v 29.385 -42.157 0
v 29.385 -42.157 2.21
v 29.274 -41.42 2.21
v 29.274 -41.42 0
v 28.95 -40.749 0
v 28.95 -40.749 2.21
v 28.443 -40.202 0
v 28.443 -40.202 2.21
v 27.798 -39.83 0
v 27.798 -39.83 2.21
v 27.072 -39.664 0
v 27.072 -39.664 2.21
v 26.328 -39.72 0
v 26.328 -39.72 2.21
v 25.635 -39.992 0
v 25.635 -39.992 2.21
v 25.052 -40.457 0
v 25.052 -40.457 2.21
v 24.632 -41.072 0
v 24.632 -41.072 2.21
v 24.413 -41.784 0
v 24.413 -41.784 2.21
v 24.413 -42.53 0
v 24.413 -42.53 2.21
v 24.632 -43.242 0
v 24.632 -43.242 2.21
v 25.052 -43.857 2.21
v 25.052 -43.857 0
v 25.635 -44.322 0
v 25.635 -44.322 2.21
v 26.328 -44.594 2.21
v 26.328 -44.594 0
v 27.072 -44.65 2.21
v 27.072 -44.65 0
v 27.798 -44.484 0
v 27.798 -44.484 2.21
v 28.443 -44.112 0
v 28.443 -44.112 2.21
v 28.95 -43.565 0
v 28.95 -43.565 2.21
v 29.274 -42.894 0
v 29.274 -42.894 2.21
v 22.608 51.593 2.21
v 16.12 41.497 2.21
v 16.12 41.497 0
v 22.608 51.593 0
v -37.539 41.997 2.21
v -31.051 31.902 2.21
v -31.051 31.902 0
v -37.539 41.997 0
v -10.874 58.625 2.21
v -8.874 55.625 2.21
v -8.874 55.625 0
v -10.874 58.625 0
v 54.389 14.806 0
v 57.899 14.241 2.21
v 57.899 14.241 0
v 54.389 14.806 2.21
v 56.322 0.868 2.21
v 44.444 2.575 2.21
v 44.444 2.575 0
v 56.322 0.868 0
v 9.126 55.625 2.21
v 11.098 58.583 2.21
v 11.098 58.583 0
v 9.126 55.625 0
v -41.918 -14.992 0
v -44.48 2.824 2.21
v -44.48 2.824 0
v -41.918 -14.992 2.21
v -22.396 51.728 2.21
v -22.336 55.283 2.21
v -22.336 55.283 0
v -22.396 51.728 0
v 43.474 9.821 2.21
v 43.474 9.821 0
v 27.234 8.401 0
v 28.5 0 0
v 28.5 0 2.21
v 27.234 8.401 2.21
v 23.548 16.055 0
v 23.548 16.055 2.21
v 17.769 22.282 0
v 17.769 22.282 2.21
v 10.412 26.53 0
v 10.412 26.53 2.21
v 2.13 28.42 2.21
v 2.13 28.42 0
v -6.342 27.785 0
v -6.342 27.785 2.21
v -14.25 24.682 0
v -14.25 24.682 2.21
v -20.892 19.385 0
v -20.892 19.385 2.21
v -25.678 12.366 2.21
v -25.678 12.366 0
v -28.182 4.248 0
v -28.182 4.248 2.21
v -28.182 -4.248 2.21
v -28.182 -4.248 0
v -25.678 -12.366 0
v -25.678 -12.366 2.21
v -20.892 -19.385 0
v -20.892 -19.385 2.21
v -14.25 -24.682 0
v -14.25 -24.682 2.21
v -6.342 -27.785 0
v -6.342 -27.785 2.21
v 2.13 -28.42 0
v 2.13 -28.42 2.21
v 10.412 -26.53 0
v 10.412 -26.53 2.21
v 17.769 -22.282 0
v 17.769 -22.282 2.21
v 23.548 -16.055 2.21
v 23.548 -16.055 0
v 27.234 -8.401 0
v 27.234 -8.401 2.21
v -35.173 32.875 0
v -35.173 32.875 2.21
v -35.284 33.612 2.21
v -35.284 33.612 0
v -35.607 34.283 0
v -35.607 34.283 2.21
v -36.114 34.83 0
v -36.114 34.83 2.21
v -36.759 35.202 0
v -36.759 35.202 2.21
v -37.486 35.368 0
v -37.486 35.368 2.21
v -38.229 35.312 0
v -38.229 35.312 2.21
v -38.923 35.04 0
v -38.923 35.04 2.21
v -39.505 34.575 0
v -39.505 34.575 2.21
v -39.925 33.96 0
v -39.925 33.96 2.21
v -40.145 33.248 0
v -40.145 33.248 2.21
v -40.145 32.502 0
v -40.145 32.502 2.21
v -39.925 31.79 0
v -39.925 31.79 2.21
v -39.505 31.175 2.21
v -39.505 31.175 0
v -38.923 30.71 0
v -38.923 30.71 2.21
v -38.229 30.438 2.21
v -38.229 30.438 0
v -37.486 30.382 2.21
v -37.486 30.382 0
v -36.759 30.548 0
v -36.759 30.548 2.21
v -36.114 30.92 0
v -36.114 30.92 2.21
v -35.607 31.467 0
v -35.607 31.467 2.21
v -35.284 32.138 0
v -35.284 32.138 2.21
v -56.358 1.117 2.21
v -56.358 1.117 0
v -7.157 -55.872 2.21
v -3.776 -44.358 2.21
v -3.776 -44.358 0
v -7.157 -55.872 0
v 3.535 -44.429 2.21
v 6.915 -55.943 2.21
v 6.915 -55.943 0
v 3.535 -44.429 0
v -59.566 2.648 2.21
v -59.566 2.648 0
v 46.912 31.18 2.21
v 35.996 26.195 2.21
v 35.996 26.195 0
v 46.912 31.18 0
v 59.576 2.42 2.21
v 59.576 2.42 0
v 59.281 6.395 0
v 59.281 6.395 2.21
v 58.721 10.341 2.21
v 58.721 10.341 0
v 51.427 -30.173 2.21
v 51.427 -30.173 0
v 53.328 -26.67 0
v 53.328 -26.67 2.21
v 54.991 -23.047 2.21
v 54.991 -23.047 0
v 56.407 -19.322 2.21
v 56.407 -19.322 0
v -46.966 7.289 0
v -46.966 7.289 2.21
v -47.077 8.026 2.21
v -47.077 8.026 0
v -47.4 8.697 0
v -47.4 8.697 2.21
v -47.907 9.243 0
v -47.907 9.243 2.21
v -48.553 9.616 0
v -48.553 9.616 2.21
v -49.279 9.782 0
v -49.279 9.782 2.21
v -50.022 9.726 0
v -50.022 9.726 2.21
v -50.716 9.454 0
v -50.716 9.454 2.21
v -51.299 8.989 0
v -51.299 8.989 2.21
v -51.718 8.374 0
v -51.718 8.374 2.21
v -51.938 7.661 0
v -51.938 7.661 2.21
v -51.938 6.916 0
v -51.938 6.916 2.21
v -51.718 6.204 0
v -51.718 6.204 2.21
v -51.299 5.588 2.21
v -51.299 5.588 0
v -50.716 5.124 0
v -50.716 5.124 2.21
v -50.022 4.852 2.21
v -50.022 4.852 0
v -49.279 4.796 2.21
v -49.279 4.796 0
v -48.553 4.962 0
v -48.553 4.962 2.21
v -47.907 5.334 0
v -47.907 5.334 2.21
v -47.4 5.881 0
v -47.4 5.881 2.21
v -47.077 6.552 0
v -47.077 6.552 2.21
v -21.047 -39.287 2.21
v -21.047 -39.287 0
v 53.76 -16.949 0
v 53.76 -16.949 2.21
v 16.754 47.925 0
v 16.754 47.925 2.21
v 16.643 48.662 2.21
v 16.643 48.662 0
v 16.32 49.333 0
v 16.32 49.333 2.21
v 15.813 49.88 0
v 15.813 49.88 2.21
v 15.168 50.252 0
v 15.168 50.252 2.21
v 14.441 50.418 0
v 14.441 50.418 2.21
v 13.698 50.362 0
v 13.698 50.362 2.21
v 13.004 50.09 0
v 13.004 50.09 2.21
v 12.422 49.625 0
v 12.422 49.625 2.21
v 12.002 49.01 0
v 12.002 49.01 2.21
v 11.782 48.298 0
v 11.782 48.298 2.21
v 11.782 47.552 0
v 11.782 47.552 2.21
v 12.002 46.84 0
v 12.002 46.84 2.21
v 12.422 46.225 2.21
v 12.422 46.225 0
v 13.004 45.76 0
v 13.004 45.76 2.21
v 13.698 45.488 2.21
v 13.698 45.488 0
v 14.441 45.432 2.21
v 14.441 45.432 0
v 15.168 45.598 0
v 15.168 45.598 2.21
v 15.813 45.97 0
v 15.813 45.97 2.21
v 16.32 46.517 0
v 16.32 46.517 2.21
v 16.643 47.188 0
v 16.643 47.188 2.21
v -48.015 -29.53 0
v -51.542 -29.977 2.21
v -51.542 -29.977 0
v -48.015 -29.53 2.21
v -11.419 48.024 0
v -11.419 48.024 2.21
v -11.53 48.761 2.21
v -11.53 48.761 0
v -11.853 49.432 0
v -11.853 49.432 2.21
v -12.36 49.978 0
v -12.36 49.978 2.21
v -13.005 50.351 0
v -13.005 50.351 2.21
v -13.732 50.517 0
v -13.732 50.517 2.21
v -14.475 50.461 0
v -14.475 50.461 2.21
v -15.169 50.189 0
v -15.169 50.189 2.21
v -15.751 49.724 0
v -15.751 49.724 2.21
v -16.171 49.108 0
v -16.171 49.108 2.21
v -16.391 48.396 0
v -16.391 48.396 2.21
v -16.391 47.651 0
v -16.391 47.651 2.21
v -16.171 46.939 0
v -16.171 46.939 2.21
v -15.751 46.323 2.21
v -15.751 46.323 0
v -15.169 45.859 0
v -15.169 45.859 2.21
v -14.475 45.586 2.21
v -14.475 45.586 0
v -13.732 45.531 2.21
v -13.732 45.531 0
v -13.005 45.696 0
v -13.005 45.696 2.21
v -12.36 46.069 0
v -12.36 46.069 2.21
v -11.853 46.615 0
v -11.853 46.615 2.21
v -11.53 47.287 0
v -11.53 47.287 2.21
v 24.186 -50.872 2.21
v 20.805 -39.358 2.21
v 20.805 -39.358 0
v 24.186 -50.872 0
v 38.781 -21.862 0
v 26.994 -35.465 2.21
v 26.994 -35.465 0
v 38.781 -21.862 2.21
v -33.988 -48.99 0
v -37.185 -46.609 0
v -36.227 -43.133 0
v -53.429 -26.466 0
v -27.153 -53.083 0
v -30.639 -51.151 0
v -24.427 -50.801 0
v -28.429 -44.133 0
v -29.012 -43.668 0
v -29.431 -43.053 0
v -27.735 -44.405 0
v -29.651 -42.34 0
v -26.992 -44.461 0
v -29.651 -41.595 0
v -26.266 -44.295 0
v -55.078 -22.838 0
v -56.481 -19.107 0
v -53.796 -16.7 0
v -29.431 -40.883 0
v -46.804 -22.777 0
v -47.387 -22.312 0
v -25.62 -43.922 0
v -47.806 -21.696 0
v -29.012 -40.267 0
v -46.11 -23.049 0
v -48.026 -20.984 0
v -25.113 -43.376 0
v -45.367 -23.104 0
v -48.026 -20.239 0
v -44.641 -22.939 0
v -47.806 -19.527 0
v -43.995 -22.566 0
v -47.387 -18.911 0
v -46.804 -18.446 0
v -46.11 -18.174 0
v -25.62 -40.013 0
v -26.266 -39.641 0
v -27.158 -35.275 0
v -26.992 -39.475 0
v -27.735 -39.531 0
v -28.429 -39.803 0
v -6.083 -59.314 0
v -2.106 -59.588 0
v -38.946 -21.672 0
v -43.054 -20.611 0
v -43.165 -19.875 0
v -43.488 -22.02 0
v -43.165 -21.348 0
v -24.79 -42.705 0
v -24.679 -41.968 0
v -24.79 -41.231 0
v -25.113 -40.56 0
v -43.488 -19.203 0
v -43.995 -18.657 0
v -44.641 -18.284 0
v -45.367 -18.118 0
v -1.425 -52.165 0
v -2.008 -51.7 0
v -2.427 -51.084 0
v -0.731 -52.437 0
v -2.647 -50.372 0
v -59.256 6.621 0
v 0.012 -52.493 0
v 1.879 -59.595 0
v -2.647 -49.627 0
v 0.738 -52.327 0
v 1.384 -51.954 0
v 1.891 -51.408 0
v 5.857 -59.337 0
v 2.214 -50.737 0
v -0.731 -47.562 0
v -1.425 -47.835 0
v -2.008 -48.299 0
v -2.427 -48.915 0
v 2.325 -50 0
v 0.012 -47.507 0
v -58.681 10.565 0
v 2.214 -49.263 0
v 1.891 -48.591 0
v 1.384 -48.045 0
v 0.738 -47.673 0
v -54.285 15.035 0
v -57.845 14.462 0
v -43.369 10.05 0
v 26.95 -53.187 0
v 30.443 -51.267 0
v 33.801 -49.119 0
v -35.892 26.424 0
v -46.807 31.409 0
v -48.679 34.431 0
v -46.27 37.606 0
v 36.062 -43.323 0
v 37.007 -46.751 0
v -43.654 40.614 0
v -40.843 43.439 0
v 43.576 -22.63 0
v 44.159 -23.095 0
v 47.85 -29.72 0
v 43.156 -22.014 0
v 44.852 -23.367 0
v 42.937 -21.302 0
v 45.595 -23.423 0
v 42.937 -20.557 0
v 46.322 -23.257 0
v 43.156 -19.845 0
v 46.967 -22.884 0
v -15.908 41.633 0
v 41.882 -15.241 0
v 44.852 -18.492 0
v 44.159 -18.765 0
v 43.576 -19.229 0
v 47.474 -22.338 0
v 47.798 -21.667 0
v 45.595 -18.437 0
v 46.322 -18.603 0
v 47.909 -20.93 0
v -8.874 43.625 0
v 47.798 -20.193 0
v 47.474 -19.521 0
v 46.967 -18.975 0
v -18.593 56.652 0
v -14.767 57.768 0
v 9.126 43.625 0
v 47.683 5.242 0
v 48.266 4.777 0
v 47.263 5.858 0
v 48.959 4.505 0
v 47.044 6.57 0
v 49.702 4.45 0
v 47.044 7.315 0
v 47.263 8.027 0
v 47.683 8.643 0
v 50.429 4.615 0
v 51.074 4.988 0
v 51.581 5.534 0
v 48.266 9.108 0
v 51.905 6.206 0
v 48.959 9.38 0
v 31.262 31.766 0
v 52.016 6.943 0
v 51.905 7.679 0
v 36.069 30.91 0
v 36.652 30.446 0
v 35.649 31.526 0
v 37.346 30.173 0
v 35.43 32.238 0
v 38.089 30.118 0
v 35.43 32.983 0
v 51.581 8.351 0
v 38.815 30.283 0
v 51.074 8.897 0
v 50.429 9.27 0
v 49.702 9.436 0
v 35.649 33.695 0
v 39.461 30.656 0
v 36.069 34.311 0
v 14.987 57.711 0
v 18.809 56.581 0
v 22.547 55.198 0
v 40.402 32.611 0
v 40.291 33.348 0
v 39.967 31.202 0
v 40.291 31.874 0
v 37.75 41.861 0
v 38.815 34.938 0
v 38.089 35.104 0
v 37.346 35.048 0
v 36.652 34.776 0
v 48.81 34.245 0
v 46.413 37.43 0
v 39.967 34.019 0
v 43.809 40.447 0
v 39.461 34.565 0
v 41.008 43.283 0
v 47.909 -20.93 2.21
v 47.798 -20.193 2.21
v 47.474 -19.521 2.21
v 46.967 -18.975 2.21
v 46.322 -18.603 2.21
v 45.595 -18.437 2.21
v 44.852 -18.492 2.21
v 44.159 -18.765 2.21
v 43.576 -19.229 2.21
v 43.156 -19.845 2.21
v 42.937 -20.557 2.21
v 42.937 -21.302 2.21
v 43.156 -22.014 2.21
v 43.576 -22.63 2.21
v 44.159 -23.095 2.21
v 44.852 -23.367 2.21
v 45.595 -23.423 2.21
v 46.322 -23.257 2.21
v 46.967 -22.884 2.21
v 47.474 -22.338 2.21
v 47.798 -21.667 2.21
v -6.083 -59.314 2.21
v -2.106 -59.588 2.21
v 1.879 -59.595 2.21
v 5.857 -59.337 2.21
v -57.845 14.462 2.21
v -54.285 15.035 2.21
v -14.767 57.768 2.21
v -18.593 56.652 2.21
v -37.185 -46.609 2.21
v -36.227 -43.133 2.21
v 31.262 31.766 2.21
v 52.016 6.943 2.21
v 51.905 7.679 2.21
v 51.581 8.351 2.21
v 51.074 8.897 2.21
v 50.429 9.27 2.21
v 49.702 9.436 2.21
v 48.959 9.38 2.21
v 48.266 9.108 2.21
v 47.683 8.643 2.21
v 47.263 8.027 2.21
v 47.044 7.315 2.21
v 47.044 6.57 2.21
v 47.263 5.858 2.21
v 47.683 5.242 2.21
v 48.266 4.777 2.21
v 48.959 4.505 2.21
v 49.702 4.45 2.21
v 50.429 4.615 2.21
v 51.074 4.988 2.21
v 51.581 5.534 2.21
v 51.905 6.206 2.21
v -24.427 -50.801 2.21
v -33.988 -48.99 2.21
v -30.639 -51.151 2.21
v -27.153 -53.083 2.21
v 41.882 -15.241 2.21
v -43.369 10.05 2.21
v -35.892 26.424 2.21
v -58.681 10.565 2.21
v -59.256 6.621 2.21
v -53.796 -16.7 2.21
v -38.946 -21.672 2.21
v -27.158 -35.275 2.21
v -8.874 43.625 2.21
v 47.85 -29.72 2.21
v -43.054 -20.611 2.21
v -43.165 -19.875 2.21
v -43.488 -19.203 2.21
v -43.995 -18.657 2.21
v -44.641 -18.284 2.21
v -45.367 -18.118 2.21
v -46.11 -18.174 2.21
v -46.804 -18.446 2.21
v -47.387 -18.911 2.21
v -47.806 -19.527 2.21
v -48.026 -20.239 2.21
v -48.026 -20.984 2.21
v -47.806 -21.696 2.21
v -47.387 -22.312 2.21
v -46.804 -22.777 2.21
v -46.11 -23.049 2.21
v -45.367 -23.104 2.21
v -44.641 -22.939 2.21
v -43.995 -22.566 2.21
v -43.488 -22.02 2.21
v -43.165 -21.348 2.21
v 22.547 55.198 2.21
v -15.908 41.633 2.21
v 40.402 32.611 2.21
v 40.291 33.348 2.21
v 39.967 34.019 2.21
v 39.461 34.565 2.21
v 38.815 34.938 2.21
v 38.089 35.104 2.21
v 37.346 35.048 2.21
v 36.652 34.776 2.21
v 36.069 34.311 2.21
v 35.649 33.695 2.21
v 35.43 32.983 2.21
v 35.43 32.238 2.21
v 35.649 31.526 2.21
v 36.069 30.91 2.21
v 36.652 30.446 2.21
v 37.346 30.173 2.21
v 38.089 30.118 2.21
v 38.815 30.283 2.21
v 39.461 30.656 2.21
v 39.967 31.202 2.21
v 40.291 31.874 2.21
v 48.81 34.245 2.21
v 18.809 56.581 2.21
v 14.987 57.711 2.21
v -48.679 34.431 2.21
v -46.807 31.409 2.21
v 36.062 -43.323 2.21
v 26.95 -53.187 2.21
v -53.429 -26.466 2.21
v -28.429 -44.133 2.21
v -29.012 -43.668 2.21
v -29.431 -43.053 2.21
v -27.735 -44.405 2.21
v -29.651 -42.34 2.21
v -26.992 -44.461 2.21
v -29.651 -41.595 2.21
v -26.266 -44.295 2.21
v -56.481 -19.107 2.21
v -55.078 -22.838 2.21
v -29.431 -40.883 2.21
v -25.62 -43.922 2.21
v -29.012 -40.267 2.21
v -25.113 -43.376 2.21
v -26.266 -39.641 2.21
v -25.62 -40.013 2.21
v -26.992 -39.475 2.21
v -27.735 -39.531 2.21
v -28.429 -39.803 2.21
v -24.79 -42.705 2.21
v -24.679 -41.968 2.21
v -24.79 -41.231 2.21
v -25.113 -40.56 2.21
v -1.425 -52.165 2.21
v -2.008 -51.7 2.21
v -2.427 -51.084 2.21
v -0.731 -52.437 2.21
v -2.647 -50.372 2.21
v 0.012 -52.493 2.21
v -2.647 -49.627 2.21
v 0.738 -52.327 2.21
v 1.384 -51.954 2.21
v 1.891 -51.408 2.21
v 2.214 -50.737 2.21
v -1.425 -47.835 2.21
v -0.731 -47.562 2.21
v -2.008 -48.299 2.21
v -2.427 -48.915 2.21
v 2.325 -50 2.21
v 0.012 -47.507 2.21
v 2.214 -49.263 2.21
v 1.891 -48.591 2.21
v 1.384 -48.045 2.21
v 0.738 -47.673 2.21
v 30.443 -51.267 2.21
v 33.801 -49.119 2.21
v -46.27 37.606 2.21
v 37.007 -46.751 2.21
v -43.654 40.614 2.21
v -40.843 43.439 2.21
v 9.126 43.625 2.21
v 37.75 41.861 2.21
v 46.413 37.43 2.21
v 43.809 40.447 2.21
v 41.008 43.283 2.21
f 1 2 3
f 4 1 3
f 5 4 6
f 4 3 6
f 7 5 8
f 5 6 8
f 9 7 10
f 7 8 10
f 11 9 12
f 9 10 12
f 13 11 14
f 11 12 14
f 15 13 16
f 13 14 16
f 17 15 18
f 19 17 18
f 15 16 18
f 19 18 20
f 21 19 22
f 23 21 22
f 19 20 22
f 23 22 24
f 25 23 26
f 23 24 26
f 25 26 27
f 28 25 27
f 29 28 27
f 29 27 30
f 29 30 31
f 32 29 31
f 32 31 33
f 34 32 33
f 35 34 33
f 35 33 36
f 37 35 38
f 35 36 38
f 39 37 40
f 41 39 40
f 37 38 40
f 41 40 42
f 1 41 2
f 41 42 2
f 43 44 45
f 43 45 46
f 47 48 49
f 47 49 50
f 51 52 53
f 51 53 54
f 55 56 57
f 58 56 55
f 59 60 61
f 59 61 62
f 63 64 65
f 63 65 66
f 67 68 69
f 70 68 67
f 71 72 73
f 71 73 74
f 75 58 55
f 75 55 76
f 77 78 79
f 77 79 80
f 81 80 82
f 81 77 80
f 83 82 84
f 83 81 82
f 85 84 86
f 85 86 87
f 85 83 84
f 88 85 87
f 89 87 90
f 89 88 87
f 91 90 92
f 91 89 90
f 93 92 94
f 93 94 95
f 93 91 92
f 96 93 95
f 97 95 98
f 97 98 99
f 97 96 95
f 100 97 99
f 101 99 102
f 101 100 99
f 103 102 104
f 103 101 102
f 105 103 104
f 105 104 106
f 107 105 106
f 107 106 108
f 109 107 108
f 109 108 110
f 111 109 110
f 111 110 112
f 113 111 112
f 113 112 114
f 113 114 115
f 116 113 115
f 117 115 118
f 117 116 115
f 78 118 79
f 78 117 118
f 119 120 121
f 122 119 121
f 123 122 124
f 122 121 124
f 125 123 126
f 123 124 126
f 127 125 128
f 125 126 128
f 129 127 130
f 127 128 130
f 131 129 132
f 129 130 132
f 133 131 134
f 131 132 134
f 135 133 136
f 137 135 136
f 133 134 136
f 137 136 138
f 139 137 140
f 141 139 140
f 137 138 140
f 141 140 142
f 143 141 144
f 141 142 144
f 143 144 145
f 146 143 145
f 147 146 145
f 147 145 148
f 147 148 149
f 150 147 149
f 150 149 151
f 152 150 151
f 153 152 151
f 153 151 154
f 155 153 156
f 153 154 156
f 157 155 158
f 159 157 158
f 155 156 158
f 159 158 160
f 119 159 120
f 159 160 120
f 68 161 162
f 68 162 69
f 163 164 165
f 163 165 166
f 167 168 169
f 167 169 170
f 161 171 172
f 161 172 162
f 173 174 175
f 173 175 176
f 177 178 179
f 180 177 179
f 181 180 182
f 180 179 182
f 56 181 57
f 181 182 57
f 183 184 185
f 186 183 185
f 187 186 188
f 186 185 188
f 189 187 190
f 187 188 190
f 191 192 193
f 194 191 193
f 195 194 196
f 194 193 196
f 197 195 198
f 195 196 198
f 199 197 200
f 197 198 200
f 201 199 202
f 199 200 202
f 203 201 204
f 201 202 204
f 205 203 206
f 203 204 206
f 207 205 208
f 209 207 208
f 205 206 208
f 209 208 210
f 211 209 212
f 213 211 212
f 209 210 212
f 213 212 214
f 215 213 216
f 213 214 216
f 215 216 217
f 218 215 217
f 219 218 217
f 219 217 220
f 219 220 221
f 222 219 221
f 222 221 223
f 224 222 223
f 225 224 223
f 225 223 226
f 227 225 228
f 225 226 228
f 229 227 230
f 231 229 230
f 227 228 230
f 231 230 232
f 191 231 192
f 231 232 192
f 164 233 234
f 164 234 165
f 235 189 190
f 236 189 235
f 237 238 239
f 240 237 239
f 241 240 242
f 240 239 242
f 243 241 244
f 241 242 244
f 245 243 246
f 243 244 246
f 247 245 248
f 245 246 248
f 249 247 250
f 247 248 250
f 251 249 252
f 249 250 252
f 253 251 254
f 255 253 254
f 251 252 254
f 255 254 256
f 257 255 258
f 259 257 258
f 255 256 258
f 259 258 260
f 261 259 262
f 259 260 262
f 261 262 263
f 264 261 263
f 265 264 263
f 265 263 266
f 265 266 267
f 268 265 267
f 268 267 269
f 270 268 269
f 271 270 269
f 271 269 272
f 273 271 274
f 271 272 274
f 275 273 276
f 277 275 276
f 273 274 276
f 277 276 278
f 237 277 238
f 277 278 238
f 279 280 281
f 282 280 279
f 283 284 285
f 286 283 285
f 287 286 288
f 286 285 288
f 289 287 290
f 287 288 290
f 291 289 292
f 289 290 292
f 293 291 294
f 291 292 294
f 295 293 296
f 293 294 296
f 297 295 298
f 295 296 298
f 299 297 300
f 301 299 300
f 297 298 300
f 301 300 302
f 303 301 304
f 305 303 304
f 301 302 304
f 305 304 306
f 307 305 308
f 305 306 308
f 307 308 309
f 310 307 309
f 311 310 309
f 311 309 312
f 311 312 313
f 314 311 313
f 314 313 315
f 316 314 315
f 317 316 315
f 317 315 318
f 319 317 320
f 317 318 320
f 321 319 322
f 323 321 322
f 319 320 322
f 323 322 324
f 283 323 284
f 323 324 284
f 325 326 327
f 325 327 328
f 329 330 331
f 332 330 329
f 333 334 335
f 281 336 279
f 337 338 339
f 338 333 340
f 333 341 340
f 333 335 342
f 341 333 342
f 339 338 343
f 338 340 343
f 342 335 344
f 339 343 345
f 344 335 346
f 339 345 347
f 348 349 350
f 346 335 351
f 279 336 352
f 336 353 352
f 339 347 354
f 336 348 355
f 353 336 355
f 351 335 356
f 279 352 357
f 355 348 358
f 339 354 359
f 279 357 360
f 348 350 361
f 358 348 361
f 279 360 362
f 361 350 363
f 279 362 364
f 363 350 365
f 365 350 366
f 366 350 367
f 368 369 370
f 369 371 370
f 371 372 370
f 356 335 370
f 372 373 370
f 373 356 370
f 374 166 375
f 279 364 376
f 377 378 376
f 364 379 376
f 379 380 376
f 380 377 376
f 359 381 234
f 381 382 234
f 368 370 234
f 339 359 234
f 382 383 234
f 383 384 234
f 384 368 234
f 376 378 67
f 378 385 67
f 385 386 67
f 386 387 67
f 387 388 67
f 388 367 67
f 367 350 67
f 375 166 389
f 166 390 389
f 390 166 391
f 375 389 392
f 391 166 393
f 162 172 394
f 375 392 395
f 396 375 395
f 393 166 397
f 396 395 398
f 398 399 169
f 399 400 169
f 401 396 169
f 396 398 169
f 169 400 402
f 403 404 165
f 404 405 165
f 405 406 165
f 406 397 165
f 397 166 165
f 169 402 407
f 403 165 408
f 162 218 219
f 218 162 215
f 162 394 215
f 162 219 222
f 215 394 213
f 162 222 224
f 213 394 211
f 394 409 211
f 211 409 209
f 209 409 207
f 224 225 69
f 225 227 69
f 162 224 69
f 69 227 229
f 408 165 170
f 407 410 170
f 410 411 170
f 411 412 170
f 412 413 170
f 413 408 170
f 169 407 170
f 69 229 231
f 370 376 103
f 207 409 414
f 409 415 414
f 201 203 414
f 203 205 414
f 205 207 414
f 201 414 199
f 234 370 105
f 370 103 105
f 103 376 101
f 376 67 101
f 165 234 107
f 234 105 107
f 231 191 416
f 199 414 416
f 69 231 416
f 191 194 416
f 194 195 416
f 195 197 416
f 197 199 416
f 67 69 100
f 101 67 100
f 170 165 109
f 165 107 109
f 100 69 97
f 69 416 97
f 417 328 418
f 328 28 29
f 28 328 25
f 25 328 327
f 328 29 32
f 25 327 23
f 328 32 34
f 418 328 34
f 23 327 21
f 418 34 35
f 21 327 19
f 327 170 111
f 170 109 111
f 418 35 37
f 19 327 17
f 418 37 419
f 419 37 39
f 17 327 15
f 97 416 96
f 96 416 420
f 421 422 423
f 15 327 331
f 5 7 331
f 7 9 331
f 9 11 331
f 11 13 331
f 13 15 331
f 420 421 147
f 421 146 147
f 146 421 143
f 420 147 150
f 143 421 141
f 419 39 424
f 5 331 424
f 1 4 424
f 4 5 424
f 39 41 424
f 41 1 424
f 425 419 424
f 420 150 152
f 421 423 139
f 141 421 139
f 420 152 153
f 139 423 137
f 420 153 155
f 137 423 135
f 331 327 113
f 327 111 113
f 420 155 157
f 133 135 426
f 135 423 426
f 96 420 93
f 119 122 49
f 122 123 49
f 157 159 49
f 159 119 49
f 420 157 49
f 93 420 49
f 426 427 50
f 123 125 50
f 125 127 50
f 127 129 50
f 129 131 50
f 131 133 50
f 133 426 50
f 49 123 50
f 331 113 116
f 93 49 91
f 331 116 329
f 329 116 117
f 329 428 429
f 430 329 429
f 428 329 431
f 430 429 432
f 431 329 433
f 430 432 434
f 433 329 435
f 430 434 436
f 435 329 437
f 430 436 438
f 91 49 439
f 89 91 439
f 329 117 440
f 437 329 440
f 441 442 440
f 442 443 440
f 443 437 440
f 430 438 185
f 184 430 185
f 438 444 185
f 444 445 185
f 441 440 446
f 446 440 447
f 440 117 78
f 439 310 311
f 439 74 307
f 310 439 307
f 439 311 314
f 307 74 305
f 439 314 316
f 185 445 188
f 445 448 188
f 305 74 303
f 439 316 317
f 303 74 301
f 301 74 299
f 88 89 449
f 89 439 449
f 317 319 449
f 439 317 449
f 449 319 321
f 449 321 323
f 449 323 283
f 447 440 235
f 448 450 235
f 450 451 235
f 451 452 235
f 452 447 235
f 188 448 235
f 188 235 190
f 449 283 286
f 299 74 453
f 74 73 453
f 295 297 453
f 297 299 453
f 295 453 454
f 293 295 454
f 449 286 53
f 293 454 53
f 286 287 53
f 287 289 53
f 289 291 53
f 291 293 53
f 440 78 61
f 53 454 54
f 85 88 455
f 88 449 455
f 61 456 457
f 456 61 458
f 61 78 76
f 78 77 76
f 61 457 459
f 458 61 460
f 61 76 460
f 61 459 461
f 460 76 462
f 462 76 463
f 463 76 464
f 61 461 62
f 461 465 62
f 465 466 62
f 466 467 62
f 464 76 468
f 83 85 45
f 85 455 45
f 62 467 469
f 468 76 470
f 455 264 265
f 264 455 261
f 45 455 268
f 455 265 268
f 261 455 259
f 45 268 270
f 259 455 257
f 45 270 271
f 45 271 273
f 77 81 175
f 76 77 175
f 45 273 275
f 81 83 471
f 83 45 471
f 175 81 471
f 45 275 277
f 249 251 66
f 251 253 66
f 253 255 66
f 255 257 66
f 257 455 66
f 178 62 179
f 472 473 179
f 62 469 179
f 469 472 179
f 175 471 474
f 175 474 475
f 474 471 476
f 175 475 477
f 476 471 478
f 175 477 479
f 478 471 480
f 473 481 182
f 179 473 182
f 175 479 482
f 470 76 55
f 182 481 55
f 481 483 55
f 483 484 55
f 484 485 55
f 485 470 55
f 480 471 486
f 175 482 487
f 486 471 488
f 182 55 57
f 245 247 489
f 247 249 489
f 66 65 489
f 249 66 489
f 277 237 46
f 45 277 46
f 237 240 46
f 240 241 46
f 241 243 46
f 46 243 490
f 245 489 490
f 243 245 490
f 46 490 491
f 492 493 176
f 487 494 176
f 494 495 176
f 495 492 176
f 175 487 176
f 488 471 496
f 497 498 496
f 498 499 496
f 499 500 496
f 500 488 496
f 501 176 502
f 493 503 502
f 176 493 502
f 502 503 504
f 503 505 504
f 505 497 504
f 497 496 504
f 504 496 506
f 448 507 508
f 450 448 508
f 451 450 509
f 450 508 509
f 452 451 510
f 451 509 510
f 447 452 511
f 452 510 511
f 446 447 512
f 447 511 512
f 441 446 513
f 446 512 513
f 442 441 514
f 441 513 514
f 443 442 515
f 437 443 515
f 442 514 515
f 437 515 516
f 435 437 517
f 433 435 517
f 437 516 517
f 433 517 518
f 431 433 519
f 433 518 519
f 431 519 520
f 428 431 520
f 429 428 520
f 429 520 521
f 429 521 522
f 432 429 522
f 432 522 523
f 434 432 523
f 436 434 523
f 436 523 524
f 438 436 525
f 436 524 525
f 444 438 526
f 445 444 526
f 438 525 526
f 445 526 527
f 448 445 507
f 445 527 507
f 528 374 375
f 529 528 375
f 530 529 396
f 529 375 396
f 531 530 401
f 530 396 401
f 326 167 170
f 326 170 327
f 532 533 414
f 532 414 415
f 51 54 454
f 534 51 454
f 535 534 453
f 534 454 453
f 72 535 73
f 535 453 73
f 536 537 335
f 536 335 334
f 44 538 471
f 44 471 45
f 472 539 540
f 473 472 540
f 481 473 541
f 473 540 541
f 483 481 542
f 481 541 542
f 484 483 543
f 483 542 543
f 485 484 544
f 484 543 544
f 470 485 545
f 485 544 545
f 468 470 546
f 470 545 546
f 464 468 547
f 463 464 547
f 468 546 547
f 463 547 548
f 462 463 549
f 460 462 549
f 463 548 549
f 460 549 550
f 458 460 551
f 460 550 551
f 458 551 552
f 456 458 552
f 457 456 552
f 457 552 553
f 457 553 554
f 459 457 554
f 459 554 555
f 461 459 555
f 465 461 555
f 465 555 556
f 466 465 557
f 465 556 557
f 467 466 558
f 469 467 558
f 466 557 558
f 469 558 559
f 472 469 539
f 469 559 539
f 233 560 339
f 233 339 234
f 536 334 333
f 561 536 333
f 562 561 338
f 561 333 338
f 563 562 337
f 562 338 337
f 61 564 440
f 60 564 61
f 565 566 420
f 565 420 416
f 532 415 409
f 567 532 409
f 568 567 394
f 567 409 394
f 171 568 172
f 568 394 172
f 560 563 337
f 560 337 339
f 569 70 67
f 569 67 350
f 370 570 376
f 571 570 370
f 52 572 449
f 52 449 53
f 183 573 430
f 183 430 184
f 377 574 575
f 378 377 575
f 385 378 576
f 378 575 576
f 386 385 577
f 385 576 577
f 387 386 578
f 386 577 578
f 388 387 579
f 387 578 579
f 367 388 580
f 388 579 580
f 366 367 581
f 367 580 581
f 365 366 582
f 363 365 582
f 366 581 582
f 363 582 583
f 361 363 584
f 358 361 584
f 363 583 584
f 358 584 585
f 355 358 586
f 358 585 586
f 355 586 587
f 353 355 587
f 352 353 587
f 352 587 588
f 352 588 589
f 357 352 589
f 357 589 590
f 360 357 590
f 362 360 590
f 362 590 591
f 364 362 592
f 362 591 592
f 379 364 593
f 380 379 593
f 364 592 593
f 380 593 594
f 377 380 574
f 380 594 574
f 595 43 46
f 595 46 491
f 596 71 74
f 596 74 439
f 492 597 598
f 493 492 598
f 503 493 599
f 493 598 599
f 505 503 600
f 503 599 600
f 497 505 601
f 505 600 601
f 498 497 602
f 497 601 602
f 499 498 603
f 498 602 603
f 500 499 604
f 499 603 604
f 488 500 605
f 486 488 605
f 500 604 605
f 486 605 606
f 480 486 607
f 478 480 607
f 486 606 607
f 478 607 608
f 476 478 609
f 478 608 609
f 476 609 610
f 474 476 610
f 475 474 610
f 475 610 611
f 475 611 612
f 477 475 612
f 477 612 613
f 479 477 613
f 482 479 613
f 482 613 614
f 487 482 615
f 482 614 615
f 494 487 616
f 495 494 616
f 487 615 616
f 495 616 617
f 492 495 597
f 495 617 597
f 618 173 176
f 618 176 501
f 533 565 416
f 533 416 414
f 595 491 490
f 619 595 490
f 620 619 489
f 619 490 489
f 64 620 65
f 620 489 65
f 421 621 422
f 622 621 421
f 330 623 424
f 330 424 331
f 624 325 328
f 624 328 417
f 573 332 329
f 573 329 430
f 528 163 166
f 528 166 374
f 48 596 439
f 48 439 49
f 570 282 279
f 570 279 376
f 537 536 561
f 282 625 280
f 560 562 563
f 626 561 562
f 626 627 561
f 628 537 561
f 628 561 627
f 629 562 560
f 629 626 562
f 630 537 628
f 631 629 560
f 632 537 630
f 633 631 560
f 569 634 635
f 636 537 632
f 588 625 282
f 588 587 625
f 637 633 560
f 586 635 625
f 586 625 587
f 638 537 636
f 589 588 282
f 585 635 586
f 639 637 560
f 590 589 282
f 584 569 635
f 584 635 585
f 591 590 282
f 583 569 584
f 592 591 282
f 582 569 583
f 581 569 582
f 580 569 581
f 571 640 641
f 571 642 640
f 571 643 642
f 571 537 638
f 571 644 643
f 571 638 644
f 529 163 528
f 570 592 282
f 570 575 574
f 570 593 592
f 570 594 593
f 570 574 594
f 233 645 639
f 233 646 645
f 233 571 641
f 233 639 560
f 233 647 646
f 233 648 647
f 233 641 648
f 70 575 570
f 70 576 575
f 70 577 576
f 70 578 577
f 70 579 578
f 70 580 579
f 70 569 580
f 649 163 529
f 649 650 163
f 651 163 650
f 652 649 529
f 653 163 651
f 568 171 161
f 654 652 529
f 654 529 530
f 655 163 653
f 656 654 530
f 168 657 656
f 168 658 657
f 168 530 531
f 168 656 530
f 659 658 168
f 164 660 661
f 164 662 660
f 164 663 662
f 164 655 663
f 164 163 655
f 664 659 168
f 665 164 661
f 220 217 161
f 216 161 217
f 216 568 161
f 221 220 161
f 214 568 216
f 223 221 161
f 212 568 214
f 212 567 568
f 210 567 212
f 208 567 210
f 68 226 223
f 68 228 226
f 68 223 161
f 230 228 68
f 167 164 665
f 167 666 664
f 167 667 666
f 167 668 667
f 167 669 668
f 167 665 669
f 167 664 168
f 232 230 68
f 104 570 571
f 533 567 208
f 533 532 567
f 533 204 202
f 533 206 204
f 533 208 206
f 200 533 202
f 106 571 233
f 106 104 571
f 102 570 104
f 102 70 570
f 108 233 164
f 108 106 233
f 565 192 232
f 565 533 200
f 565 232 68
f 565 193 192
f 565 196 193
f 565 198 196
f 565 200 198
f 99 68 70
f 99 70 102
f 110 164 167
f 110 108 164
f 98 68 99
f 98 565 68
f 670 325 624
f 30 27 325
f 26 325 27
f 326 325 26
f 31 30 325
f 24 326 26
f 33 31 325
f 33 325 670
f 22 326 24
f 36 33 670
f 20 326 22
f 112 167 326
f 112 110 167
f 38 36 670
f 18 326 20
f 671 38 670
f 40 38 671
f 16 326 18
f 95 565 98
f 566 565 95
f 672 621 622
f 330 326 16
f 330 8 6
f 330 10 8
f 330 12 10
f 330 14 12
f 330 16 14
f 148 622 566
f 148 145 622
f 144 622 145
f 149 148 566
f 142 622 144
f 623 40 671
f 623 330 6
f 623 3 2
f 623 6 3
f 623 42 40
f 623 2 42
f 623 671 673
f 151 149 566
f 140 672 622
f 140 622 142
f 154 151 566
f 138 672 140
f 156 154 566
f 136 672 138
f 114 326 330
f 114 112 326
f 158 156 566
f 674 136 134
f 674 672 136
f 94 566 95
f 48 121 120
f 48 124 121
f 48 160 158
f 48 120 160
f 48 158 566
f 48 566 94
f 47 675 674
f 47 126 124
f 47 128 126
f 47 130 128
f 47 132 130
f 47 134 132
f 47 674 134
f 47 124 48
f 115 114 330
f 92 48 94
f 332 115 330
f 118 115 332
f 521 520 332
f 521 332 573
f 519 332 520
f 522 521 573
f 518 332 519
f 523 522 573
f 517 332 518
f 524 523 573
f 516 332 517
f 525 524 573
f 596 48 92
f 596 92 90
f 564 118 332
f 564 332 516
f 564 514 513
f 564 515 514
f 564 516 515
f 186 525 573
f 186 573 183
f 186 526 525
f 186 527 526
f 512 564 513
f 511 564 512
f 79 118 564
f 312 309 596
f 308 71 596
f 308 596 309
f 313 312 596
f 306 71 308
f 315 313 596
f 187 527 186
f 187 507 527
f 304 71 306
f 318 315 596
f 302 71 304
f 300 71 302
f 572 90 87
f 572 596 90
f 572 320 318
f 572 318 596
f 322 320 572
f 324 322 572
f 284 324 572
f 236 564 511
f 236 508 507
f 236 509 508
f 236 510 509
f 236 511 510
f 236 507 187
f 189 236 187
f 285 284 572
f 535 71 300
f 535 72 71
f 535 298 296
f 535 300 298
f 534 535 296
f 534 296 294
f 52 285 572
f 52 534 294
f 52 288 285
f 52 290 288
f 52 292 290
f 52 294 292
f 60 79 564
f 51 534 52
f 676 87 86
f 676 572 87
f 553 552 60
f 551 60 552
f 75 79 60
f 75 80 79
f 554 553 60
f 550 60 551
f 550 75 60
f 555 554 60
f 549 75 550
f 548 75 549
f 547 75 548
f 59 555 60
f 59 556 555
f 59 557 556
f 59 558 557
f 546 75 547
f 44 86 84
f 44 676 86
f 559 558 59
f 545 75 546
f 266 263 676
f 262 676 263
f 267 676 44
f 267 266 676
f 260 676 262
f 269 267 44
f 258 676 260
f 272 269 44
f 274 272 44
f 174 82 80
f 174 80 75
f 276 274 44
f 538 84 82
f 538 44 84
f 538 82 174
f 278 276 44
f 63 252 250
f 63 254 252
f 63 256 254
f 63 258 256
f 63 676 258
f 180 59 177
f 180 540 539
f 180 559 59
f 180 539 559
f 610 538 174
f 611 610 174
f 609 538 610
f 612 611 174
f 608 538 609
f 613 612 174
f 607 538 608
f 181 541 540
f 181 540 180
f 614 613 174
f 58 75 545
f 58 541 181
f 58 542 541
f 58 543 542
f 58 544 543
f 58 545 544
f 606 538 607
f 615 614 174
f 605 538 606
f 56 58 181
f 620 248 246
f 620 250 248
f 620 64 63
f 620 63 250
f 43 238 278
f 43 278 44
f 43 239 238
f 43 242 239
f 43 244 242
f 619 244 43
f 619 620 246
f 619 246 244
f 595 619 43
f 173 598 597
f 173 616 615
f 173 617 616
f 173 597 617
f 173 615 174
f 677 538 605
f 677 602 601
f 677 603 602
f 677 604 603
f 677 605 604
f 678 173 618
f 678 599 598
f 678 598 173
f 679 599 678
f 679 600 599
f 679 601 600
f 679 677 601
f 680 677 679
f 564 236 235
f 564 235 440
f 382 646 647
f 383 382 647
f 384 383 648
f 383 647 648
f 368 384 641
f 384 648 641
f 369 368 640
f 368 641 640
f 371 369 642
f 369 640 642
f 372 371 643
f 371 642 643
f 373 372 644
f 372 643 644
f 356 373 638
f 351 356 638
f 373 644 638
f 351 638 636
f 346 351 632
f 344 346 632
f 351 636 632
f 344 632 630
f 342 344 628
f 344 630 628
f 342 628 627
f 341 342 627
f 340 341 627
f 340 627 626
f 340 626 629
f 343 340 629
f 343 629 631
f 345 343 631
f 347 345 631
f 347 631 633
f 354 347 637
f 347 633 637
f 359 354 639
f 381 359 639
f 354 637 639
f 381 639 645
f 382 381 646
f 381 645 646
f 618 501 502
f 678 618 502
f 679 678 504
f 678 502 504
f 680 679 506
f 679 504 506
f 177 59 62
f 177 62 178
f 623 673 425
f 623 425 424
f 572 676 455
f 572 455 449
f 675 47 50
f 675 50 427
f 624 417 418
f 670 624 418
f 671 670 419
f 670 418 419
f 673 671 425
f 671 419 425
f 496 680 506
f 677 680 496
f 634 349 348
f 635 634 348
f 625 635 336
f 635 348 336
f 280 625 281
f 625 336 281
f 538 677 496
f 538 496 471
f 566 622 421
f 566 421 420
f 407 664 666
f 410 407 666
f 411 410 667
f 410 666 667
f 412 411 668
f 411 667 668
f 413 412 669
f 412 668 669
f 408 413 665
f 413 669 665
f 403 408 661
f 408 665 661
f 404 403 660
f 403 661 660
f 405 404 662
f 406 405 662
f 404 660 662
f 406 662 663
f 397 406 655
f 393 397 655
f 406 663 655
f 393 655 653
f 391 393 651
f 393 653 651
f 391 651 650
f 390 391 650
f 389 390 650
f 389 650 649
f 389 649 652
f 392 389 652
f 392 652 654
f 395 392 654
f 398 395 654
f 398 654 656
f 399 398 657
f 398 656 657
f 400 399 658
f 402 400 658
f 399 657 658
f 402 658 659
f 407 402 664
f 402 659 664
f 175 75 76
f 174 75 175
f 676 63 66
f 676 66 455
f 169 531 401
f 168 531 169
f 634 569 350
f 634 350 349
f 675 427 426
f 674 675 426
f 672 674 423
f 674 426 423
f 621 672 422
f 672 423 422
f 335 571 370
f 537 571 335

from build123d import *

# Parameters (mm, degrees)
SKETCH1_R           = 59.625
SKETCH1_R_2         = 28.5
BOSS_EXTRUDE1_DEPTH = 2.21
CUT_EXTRUDE2_DEPTH  = 2.21
SKETCH6_R           = 2.5
CUT_EXTRUDE4_DEPTH  = 2.21


with BuildPart() as part:
    # Sketch1 → Boss-Extrude1 (new body)
    with BuildSketch(Plane.XY):
        Circle(SKETCH1_R)
        Circle(SKETCH1_R_2, mode=Mode.SUBTRACT)
    extrude(amount=BOSS_EXTRUDE1_DEPTH)

    # Sketch2 → Cut-Extrude2 (cut)
    with BuildSketch(Plane.XY.offset(2.21)):
        Polygon((-8.874281585, 55.625), (-10.874281585, 58.625), (-8.874281585, 59.625), (9.125718415, 59.625), (11.125718415, 58.625), (9.125718415, 55.625), (9.125718415, 43.625), (-8.874281585, 43.625), align=None)
        Polygon((22.607624736, 51.592526614), (22.547040123, 55.197568848), (24.770188006, 54.957540746), (39.912751597, 45.226006032), (41.054617845, 43.303470864), (37.750188327, 41.8609919), (31.262498517, 31.765949506), (16.119934926, 41.49748422), align=None)
        Polygon((46.911769941, 31.179790564), (48.809835901, 34.245299594), (50.550297923, 32.841450616), (58.027768157, 16.4680747), (57.948966187, 14.233395696), (54.389240175, 14.806414648), (43.473656231, 9.821434492), (35.996185997, 26.194810408), align=None)
        Polygon((56.321759653, 0.867691316), (59.575853655, 2.420389685), (60.281045421, 0.298431963), (57.719378332, -17.518353991), (56.444927213, -19.355682037), (53.760092564, -16.949094638), (41.882235262, -15.241316579), (44.443902351, 2.575469375), align=None)
        Polygon((47.849988626, -29.719893795), (51.426958817, -30.172976848), (50.872986923, -32.339336731), (39.085493712, -45.942829069), (37.02002267, -46.799467484), (36.062495415, -43.323386133), (26.993500522, -35.465057326), (38.780993734, -21.861564987), align=None)
        Polygon((24.186184301, -50.871622616), (26.950367919, -53.186636423), (25.313114529, -54.709594511), (8.042241004, -59.780780534), (5.8415225, -59.384752674), (6.915310776, -55.942808639), (3.534520094, -44.428892956), (20.805393619, -39.357706933), align=None)
        Polygon((-7.156562647, -55.871970699), (-6.08277437, -59.313914733), (-8.283492875, -59.709942593), (-25.5543664, -54.63875657), (-27.19161979, -53.115798483), (-24.427436172, -50.800784675), (-21.04664549, -39.286868992), (-3.775771965, -44.358055015), align=None)
        Polygon((-36.227151521, -43.133362857), (-37.184678776, -46.609444207), (-39.250149819, -45.752805792), (-51.03764303, -32.149313454), (-51.591614923, -29.982953571), (-48.014644732, -29.529870518), (-38.94564984, -21.671541711), (-27.158156629, -35.275034049), align=None)
        Polygon((-53.795875756, -16.700217074), (-56.480710405, -19.106804472), (-57.755161524, -17.269476427), (-60.316828612, 0.547309527), (-59.611636847, 2.669267249), (-56.357542845, 1.11656888), (-44.479685542, 2.82434694), (-41.918018453, -14.992439014), align=None)
        Polygon((-54.284789542, 15.035129632), (-57.844515554, 14.462110681), (-57.923317523, 16.696789684), (-50.445847289, 33.070165601), (-48.705385268, 34.474014578), (-46.807319308, 31.408505549), (-35.891735364, 26.423525393), (-43.369205598, 10.050149476), align=None)
        Polygon((-37.538666206, 41.996928913), (-40.843095724, 43.439407877), (-39.701229476, 45.361943044), (-24.558665885, 55.093477759), (-22.335518002, 55.333505861), (-22.396102615, 51.728463627), (-15.908412806, 41.633421233), (-31.050976397, 31.901886519), align=None)
    extrude(amount=-CUT_EXTRUDE2_DEPTH, mode=Mode.SUBTRACT)

    # Sketch6 → Cut-Extrude4 (cut)
    with BuildSketch(Plane.XY.offset(2.21)):
        with Locations((-13.918677225, 48.02364443)):
            Circle(SKETCH6_R)
        with Locations((14.254405994, 47.925065569)):
            Circle(SKETCH6_R)
        with Locations((37.901816027, 32.610617012)):
            Circle(SKETCH6_R)
        with Locations((49.515667272, 6.942527969)):
            Circle(SKETCH6_R)
        with Locations((45.40864402, -20.92976465)):
            Circle(SKETCH6_R)
        with Locations((26.884697133, -42.157004875)):
            Circle(SKETCH6_R)
        with Locations((-0.174951135, -49.99969392)):
            Circle(SKETCH6_R)
        with Locations((-27.179053654, -41.967833426)):
            Circle(SKETCH6_R)
        with Locations((-45.553998676, -20.61148235)):
            Circle(SKETCH6_R)
        with Locations((-49.465870987, 7.288868739)):
            Circle(SKETCH6_R)
        with Locations((-37.672678769, 32.875055503)):
            Circle(SKETCH6_R)
    extrude(amount=-CUT_EXTRUDE4_DEPTH, mode=Mode.SUBTRACT)


solid = part.part
